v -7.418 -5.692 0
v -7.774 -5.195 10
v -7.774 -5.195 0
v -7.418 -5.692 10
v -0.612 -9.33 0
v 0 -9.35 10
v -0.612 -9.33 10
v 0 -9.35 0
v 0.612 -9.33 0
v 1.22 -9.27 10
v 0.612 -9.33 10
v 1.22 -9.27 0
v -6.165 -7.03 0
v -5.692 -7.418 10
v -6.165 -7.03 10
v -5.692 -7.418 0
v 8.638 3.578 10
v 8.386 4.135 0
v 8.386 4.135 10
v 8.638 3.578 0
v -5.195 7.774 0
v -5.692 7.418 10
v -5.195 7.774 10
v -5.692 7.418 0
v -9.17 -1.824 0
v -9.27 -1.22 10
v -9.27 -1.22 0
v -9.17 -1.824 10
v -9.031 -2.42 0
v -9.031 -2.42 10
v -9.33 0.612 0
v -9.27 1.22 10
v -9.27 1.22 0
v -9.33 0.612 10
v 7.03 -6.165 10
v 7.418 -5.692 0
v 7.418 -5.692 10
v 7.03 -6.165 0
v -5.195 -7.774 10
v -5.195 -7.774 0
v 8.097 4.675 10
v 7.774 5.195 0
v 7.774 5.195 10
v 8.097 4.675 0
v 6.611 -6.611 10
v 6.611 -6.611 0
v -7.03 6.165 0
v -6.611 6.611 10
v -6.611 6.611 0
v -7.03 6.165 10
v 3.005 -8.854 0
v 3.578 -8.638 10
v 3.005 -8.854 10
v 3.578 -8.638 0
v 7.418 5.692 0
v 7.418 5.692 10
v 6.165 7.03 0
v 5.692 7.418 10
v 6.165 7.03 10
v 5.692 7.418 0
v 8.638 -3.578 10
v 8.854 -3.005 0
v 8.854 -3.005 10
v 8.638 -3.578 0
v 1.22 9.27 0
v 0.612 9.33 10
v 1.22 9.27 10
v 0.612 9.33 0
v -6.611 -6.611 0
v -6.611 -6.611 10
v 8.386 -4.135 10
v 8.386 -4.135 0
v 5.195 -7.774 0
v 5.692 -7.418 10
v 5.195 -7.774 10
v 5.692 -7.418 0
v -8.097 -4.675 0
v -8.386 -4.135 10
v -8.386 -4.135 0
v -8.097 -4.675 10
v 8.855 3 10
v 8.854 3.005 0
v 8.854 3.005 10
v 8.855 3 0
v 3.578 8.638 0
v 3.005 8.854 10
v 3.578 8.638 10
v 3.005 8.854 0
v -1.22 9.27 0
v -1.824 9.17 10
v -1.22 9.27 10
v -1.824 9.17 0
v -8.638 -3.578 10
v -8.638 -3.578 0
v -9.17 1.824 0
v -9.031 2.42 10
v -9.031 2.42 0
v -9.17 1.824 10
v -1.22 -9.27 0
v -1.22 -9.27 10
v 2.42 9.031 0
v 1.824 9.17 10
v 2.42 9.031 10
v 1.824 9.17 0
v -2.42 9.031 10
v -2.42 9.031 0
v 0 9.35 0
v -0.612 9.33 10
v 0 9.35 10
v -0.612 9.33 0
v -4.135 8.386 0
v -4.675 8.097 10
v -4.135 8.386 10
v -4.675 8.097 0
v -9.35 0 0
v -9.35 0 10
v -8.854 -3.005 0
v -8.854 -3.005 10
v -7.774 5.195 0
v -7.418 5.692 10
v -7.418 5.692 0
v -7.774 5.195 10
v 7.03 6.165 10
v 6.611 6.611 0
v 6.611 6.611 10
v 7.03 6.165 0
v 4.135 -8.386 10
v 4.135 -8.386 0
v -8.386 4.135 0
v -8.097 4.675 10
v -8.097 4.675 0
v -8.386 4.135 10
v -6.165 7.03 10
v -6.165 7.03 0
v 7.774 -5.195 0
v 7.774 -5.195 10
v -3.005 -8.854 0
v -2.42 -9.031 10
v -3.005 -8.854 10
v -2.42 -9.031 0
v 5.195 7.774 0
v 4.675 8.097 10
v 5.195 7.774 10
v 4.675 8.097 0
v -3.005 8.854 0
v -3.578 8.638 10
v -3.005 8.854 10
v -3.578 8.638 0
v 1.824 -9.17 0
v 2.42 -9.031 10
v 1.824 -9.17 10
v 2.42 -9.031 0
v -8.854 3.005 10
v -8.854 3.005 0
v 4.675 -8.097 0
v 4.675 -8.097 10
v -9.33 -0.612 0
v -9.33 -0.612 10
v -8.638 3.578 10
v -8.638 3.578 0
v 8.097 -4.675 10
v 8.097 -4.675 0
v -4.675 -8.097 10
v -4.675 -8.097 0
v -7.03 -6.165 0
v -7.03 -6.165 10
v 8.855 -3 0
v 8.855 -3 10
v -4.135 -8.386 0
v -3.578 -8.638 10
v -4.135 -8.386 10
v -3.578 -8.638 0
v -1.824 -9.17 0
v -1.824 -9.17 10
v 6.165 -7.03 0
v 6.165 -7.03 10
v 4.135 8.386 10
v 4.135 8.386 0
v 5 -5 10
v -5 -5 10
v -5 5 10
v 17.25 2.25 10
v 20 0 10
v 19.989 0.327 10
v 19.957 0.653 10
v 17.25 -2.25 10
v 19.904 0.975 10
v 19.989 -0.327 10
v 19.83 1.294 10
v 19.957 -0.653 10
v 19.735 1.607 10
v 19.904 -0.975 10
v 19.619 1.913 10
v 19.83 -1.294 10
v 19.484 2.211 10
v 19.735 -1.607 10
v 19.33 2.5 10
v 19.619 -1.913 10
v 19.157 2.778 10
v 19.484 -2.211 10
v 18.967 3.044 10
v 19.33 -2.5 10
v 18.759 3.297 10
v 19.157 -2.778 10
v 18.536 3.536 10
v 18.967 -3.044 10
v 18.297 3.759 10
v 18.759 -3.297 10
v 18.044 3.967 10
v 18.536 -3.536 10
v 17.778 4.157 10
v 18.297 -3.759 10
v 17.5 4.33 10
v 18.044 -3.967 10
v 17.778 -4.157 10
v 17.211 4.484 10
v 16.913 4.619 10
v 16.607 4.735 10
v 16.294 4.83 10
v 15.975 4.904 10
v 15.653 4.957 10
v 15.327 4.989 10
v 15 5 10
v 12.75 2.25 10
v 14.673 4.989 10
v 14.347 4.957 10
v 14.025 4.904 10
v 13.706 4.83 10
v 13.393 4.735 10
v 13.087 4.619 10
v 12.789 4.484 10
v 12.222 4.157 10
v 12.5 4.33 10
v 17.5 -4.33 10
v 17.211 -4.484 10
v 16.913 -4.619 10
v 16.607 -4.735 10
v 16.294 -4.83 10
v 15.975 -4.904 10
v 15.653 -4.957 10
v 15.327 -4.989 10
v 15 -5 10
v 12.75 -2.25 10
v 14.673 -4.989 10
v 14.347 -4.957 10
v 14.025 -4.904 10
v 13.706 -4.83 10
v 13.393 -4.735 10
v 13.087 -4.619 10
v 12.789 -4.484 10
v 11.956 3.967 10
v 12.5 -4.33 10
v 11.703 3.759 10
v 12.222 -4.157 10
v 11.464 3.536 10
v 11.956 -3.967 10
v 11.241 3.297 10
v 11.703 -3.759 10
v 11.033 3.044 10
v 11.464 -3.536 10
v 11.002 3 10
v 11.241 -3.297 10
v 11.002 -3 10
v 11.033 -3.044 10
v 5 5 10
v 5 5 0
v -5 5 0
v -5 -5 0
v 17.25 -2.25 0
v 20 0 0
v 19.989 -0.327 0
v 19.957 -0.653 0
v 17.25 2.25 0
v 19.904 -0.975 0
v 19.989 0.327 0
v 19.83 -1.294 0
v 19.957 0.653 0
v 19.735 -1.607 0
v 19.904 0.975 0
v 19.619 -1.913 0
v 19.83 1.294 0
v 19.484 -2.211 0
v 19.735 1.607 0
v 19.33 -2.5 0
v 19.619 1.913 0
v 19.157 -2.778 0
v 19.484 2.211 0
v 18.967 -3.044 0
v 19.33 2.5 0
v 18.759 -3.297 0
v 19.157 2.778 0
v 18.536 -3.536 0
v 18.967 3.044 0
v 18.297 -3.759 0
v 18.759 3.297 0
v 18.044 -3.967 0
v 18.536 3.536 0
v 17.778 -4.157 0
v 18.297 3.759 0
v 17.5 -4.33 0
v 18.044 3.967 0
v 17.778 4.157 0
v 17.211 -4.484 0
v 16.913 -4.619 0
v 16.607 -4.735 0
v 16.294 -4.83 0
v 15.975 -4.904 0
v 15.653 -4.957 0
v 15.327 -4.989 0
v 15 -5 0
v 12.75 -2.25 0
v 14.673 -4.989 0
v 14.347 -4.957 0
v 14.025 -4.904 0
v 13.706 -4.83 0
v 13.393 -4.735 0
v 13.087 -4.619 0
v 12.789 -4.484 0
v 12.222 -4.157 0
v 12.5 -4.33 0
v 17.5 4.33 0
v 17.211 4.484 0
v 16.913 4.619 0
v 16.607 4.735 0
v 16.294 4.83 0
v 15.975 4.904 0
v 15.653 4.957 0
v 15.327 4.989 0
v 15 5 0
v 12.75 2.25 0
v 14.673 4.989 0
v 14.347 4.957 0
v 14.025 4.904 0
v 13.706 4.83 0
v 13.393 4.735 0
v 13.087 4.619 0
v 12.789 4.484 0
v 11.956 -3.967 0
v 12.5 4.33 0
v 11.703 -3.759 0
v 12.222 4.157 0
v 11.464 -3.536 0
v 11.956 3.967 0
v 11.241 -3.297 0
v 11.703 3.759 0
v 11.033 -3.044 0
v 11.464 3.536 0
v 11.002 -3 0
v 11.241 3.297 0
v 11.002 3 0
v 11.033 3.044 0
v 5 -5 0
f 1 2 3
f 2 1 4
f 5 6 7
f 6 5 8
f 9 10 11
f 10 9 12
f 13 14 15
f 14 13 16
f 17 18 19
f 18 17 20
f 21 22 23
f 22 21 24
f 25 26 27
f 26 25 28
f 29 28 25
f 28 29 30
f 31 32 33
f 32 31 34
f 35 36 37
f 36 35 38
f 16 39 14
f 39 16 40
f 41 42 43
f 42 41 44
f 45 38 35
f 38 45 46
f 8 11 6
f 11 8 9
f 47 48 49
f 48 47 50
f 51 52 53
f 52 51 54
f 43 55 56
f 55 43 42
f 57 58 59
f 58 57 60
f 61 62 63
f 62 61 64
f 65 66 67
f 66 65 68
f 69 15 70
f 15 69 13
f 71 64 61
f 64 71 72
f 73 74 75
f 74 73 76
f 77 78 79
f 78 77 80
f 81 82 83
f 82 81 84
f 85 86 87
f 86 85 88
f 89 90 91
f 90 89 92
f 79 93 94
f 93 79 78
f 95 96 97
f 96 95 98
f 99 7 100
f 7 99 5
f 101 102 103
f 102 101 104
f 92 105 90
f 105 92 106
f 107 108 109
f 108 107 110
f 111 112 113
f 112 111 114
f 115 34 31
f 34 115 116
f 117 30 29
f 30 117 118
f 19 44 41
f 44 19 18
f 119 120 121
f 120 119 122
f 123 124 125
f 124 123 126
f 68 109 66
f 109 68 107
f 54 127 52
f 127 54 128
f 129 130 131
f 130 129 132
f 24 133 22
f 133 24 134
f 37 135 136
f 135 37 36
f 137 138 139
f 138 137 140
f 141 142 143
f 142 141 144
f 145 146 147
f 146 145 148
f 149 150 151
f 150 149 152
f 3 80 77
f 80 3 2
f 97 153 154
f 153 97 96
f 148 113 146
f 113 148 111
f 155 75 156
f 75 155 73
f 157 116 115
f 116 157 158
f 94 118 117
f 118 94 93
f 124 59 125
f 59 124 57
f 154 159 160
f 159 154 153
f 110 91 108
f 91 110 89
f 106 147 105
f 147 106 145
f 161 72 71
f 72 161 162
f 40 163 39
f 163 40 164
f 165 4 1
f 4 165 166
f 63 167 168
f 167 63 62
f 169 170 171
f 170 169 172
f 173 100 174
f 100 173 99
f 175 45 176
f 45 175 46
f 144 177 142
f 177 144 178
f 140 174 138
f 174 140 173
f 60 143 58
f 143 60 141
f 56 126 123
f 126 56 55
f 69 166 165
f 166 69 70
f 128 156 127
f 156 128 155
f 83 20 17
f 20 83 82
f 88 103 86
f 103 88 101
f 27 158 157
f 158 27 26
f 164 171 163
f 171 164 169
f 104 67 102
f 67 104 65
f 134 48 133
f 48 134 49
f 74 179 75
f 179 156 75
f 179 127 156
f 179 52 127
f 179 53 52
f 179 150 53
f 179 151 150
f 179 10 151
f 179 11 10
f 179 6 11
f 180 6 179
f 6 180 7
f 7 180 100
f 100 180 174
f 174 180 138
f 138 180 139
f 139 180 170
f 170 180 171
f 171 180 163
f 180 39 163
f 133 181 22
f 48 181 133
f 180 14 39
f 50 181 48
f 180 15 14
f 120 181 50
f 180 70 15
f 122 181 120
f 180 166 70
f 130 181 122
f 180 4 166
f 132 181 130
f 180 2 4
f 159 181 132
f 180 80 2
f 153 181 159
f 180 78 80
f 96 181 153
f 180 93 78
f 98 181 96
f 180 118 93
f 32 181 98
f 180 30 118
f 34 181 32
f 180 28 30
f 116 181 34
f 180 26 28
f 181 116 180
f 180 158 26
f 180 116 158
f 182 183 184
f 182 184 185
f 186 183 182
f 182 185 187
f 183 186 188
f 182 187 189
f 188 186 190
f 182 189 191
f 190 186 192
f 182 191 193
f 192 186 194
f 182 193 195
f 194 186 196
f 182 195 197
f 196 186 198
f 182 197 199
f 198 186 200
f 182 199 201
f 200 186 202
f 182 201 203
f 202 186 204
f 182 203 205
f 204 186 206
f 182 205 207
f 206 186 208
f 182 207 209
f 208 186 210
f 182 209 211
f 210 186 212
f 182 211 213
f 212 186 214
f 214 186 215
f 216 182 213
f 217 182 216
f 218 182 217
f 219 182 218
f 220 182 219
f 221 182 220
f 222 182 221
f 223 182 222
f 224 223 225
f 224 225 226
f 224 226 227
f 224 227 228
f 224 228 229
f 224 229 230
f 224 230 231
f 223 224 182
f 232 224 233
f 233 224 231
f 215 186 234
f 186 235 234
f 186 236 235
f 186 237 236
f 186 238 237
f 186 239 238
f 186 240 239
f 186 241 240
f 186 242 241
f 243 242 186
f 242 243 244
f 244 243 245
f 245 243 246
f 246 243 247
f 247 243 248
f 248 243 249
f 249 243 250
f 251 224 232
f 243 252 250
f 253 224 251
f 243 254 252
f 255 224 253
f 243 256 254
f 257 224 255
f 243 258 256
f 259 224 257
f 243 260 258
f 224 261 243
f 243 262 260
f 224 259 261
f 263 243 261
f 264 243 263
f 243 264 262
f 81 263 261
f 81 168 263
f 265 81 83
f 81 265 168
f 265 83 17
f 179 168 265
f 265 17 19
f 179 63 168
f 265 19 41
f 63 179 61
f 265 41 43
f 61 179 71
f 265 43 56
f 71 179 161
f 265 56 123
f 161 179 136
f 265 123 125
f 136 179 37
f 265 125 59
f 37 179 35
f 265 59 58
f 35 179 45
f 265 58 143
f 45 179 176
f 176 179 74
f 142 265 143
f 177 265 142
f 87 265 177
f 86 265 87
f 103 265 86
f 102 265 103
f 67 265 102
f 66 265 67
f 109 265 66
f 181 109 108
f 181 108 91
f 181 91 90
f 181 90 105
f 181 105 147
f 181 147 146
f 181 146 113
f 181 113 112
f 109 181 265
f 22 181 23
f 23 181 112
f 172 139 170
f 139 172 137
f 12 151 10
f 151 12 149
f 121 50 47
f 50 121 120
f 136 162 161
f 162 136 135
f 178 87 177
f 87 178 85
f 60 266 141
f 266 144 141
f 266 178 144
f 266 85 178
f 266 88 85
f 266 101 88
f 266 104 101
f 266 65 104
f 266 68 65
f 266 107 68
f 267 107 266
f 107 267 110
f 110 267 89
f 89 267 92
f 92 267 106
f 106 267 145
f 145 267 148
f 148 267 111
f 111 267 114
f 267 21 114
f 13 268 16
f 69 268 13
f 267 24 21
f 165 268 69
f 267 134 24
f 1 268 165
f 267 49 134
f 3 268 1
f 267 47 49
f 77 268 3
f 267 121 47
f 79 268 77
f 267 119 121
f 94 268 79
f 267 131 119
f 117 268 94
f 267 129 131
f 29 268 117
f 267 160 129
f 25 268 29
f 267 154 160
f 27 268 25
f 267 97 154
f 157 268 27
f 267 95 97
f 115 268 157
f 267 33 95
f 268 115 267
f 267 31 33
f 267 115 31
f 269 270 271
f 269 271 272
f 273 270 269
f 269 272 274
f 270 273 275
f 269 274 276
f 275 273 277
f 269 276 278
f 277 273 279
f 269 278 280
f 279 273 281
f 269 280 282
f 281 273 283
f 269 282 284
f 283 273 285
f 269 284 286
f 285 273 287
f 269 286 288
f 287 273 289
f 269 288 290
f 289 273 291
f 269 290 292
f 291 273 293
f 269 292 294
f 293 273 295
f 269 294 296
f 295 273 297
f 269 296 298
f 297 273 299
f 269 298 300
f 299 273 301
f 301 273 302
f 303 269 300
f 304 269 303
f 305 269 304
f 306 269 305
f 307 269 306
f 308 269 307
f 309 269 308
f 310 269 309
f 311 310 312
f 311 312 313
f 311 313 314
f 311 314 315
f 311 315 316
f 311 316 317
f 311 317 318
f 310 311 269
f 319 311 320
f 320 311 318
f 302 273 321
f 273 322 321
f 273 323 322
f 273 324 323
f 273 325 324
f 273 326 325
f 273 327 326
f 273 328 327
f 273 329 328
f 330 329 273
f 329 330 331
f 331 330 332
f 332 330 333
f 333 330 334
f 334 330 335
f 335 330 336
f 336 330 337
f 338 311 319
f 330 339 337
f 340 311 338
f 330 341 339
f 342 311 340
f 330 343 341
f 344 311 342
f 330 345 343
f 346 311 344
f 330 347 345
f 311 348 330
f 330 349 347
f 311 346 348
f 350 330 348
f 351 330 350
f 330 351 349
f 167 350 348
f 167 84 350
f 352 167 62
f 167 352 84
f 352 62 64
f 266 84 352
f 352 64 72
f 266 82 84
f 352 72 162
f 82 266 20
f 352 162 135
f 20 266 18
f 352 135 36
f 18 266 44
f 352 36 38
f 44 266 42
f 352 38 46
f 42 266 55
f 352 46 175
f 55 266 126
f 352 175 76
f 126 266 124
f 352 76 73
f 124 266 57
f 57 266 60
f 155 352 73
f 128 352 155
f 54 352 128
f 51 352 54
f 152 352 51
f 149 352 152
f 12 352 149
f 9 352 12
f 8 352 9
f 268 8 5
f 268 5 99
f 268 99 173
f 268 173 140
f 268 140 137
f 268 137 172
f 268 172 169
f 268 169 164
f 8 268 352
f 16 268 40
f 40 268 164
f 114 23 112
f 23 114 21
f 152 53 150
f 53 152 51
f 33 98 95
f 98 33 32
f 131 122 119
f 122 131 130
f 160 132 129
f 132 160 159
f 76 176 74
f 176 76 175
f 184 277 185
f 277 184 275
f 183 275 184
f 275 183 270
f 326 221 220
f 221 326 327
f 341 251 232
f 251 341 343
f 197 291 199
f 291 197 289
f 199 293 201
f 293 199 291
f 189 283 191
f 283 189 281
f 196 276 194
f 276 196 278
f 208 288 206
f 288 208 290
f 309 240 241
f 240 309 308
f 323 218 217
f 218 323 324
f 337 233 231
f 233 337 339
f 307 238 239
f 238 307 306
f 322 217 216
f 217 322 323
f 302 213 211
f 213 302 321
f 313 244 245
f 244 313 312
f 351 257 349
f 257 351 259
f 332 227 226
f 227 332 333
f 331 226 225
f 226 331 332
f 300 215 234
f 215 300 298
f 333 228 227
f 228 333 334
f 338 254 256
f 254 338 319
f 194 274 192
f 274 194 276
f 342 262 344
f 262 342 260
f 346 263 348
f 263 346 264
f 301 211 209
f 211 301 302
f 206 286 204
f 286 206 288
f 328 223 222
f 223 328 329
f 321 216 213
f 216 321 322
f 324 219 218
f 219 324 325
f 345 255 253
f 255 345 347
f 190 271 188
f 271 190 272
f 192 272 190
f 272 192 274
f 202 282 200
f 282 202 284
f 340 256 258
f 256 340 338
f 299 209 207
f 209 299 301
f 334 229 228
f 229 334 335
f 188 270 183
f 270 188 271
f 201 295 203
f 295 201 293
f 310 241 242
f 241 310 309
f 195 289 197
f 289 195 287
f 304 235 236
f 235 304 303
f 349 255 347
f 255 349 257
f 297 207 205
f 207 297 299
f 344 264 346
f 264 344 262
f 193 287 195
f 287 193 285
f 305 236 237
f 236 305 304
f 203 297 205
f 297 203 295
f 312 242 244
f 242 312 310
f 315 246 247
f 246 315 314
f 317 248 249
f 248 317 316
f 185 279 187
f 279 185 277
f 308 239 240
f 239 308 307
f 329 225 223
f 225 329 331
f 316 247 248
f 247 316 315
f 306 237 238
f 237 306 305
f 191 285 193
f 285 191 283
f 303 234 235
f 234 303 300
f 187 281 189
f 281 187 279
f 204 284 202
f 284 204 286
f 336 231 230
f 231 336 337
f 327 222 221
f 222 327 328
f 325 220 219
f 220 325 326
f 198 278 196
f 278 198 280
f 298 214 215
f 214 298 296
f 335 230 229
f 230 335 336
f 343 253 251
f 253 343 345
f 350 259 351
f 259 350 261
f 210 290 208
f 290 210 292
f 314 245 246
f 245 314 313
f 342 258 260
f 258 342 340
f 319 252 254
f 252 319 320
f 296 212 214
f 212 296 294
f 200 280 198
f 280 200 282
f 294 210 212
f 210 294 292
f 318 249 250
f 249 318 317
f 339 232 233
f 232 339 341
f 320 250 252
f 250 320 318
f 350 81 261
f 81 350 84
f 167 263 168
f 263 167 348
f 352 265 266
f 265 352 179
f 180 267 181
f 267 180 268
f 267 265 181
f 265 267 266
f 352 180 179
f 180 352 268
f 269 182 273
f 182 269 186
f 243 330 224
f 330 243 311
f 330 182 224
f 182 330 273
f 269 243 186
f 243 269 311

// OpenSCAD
// Snap-on tubing clip for 12.7 mm lab stand rod
// Print orientation: flat on bed, builds upward in +Z

// ---------- Dimensions (mm) ----------
stand_d      = 12.7;   // stand rod inner diameter
stand_wall   = 3;      // stand rod ring wall
stand_od     = stand_d + 2 * stand_wall;  // 18.7 outer diameter

tube_d       = 6;      // tubing inner diameter
tube_wall    = 2;      // tubing ring wall
tube_od      = tube_d + 2 * tube_wall;    // 10 outer diameter

bridge_w     = 6;      // bridge width in Y
bridge_x0    = 8;      // bridge start X
bridge_x1    = 12;     // bridge end X

opening_s    = 10;     // stand rod opening width (-X side)
tube_open    = 4.5;    // tubing opening width (+X side)
eps          = 0.5;    // cutter overshoot

$fn = 96;

// ---------- Model ----------
difference() {
    union() {
        // Stand rod ring
        translate([0, 0, 0])
            cylinder(d = stand_od, h = 10);

        // Tubing ring
        translate([15, 0, 0])
            cylinder(d = tube_od, h = 10);

        // Bridge
        translate([bridge_x0, -bridge_w / 2, 0])
            cube([bridge_x1 - bridge_x0, bridge_w, 10]);
    }

    // Stand rod opening (extends past -X face)
    translate([-opening_s / 2, -opening_s / 2, -eps])
        cube([opening_s, opening_s, 10 + 2 * eps]);

    // Tubing opening (extends past +X face)
    translate([15 - tube_open / 2, -tube_open / 2, -eps])
        cube([tube_open, tube_open, 10 + 2 * eps]);
}
